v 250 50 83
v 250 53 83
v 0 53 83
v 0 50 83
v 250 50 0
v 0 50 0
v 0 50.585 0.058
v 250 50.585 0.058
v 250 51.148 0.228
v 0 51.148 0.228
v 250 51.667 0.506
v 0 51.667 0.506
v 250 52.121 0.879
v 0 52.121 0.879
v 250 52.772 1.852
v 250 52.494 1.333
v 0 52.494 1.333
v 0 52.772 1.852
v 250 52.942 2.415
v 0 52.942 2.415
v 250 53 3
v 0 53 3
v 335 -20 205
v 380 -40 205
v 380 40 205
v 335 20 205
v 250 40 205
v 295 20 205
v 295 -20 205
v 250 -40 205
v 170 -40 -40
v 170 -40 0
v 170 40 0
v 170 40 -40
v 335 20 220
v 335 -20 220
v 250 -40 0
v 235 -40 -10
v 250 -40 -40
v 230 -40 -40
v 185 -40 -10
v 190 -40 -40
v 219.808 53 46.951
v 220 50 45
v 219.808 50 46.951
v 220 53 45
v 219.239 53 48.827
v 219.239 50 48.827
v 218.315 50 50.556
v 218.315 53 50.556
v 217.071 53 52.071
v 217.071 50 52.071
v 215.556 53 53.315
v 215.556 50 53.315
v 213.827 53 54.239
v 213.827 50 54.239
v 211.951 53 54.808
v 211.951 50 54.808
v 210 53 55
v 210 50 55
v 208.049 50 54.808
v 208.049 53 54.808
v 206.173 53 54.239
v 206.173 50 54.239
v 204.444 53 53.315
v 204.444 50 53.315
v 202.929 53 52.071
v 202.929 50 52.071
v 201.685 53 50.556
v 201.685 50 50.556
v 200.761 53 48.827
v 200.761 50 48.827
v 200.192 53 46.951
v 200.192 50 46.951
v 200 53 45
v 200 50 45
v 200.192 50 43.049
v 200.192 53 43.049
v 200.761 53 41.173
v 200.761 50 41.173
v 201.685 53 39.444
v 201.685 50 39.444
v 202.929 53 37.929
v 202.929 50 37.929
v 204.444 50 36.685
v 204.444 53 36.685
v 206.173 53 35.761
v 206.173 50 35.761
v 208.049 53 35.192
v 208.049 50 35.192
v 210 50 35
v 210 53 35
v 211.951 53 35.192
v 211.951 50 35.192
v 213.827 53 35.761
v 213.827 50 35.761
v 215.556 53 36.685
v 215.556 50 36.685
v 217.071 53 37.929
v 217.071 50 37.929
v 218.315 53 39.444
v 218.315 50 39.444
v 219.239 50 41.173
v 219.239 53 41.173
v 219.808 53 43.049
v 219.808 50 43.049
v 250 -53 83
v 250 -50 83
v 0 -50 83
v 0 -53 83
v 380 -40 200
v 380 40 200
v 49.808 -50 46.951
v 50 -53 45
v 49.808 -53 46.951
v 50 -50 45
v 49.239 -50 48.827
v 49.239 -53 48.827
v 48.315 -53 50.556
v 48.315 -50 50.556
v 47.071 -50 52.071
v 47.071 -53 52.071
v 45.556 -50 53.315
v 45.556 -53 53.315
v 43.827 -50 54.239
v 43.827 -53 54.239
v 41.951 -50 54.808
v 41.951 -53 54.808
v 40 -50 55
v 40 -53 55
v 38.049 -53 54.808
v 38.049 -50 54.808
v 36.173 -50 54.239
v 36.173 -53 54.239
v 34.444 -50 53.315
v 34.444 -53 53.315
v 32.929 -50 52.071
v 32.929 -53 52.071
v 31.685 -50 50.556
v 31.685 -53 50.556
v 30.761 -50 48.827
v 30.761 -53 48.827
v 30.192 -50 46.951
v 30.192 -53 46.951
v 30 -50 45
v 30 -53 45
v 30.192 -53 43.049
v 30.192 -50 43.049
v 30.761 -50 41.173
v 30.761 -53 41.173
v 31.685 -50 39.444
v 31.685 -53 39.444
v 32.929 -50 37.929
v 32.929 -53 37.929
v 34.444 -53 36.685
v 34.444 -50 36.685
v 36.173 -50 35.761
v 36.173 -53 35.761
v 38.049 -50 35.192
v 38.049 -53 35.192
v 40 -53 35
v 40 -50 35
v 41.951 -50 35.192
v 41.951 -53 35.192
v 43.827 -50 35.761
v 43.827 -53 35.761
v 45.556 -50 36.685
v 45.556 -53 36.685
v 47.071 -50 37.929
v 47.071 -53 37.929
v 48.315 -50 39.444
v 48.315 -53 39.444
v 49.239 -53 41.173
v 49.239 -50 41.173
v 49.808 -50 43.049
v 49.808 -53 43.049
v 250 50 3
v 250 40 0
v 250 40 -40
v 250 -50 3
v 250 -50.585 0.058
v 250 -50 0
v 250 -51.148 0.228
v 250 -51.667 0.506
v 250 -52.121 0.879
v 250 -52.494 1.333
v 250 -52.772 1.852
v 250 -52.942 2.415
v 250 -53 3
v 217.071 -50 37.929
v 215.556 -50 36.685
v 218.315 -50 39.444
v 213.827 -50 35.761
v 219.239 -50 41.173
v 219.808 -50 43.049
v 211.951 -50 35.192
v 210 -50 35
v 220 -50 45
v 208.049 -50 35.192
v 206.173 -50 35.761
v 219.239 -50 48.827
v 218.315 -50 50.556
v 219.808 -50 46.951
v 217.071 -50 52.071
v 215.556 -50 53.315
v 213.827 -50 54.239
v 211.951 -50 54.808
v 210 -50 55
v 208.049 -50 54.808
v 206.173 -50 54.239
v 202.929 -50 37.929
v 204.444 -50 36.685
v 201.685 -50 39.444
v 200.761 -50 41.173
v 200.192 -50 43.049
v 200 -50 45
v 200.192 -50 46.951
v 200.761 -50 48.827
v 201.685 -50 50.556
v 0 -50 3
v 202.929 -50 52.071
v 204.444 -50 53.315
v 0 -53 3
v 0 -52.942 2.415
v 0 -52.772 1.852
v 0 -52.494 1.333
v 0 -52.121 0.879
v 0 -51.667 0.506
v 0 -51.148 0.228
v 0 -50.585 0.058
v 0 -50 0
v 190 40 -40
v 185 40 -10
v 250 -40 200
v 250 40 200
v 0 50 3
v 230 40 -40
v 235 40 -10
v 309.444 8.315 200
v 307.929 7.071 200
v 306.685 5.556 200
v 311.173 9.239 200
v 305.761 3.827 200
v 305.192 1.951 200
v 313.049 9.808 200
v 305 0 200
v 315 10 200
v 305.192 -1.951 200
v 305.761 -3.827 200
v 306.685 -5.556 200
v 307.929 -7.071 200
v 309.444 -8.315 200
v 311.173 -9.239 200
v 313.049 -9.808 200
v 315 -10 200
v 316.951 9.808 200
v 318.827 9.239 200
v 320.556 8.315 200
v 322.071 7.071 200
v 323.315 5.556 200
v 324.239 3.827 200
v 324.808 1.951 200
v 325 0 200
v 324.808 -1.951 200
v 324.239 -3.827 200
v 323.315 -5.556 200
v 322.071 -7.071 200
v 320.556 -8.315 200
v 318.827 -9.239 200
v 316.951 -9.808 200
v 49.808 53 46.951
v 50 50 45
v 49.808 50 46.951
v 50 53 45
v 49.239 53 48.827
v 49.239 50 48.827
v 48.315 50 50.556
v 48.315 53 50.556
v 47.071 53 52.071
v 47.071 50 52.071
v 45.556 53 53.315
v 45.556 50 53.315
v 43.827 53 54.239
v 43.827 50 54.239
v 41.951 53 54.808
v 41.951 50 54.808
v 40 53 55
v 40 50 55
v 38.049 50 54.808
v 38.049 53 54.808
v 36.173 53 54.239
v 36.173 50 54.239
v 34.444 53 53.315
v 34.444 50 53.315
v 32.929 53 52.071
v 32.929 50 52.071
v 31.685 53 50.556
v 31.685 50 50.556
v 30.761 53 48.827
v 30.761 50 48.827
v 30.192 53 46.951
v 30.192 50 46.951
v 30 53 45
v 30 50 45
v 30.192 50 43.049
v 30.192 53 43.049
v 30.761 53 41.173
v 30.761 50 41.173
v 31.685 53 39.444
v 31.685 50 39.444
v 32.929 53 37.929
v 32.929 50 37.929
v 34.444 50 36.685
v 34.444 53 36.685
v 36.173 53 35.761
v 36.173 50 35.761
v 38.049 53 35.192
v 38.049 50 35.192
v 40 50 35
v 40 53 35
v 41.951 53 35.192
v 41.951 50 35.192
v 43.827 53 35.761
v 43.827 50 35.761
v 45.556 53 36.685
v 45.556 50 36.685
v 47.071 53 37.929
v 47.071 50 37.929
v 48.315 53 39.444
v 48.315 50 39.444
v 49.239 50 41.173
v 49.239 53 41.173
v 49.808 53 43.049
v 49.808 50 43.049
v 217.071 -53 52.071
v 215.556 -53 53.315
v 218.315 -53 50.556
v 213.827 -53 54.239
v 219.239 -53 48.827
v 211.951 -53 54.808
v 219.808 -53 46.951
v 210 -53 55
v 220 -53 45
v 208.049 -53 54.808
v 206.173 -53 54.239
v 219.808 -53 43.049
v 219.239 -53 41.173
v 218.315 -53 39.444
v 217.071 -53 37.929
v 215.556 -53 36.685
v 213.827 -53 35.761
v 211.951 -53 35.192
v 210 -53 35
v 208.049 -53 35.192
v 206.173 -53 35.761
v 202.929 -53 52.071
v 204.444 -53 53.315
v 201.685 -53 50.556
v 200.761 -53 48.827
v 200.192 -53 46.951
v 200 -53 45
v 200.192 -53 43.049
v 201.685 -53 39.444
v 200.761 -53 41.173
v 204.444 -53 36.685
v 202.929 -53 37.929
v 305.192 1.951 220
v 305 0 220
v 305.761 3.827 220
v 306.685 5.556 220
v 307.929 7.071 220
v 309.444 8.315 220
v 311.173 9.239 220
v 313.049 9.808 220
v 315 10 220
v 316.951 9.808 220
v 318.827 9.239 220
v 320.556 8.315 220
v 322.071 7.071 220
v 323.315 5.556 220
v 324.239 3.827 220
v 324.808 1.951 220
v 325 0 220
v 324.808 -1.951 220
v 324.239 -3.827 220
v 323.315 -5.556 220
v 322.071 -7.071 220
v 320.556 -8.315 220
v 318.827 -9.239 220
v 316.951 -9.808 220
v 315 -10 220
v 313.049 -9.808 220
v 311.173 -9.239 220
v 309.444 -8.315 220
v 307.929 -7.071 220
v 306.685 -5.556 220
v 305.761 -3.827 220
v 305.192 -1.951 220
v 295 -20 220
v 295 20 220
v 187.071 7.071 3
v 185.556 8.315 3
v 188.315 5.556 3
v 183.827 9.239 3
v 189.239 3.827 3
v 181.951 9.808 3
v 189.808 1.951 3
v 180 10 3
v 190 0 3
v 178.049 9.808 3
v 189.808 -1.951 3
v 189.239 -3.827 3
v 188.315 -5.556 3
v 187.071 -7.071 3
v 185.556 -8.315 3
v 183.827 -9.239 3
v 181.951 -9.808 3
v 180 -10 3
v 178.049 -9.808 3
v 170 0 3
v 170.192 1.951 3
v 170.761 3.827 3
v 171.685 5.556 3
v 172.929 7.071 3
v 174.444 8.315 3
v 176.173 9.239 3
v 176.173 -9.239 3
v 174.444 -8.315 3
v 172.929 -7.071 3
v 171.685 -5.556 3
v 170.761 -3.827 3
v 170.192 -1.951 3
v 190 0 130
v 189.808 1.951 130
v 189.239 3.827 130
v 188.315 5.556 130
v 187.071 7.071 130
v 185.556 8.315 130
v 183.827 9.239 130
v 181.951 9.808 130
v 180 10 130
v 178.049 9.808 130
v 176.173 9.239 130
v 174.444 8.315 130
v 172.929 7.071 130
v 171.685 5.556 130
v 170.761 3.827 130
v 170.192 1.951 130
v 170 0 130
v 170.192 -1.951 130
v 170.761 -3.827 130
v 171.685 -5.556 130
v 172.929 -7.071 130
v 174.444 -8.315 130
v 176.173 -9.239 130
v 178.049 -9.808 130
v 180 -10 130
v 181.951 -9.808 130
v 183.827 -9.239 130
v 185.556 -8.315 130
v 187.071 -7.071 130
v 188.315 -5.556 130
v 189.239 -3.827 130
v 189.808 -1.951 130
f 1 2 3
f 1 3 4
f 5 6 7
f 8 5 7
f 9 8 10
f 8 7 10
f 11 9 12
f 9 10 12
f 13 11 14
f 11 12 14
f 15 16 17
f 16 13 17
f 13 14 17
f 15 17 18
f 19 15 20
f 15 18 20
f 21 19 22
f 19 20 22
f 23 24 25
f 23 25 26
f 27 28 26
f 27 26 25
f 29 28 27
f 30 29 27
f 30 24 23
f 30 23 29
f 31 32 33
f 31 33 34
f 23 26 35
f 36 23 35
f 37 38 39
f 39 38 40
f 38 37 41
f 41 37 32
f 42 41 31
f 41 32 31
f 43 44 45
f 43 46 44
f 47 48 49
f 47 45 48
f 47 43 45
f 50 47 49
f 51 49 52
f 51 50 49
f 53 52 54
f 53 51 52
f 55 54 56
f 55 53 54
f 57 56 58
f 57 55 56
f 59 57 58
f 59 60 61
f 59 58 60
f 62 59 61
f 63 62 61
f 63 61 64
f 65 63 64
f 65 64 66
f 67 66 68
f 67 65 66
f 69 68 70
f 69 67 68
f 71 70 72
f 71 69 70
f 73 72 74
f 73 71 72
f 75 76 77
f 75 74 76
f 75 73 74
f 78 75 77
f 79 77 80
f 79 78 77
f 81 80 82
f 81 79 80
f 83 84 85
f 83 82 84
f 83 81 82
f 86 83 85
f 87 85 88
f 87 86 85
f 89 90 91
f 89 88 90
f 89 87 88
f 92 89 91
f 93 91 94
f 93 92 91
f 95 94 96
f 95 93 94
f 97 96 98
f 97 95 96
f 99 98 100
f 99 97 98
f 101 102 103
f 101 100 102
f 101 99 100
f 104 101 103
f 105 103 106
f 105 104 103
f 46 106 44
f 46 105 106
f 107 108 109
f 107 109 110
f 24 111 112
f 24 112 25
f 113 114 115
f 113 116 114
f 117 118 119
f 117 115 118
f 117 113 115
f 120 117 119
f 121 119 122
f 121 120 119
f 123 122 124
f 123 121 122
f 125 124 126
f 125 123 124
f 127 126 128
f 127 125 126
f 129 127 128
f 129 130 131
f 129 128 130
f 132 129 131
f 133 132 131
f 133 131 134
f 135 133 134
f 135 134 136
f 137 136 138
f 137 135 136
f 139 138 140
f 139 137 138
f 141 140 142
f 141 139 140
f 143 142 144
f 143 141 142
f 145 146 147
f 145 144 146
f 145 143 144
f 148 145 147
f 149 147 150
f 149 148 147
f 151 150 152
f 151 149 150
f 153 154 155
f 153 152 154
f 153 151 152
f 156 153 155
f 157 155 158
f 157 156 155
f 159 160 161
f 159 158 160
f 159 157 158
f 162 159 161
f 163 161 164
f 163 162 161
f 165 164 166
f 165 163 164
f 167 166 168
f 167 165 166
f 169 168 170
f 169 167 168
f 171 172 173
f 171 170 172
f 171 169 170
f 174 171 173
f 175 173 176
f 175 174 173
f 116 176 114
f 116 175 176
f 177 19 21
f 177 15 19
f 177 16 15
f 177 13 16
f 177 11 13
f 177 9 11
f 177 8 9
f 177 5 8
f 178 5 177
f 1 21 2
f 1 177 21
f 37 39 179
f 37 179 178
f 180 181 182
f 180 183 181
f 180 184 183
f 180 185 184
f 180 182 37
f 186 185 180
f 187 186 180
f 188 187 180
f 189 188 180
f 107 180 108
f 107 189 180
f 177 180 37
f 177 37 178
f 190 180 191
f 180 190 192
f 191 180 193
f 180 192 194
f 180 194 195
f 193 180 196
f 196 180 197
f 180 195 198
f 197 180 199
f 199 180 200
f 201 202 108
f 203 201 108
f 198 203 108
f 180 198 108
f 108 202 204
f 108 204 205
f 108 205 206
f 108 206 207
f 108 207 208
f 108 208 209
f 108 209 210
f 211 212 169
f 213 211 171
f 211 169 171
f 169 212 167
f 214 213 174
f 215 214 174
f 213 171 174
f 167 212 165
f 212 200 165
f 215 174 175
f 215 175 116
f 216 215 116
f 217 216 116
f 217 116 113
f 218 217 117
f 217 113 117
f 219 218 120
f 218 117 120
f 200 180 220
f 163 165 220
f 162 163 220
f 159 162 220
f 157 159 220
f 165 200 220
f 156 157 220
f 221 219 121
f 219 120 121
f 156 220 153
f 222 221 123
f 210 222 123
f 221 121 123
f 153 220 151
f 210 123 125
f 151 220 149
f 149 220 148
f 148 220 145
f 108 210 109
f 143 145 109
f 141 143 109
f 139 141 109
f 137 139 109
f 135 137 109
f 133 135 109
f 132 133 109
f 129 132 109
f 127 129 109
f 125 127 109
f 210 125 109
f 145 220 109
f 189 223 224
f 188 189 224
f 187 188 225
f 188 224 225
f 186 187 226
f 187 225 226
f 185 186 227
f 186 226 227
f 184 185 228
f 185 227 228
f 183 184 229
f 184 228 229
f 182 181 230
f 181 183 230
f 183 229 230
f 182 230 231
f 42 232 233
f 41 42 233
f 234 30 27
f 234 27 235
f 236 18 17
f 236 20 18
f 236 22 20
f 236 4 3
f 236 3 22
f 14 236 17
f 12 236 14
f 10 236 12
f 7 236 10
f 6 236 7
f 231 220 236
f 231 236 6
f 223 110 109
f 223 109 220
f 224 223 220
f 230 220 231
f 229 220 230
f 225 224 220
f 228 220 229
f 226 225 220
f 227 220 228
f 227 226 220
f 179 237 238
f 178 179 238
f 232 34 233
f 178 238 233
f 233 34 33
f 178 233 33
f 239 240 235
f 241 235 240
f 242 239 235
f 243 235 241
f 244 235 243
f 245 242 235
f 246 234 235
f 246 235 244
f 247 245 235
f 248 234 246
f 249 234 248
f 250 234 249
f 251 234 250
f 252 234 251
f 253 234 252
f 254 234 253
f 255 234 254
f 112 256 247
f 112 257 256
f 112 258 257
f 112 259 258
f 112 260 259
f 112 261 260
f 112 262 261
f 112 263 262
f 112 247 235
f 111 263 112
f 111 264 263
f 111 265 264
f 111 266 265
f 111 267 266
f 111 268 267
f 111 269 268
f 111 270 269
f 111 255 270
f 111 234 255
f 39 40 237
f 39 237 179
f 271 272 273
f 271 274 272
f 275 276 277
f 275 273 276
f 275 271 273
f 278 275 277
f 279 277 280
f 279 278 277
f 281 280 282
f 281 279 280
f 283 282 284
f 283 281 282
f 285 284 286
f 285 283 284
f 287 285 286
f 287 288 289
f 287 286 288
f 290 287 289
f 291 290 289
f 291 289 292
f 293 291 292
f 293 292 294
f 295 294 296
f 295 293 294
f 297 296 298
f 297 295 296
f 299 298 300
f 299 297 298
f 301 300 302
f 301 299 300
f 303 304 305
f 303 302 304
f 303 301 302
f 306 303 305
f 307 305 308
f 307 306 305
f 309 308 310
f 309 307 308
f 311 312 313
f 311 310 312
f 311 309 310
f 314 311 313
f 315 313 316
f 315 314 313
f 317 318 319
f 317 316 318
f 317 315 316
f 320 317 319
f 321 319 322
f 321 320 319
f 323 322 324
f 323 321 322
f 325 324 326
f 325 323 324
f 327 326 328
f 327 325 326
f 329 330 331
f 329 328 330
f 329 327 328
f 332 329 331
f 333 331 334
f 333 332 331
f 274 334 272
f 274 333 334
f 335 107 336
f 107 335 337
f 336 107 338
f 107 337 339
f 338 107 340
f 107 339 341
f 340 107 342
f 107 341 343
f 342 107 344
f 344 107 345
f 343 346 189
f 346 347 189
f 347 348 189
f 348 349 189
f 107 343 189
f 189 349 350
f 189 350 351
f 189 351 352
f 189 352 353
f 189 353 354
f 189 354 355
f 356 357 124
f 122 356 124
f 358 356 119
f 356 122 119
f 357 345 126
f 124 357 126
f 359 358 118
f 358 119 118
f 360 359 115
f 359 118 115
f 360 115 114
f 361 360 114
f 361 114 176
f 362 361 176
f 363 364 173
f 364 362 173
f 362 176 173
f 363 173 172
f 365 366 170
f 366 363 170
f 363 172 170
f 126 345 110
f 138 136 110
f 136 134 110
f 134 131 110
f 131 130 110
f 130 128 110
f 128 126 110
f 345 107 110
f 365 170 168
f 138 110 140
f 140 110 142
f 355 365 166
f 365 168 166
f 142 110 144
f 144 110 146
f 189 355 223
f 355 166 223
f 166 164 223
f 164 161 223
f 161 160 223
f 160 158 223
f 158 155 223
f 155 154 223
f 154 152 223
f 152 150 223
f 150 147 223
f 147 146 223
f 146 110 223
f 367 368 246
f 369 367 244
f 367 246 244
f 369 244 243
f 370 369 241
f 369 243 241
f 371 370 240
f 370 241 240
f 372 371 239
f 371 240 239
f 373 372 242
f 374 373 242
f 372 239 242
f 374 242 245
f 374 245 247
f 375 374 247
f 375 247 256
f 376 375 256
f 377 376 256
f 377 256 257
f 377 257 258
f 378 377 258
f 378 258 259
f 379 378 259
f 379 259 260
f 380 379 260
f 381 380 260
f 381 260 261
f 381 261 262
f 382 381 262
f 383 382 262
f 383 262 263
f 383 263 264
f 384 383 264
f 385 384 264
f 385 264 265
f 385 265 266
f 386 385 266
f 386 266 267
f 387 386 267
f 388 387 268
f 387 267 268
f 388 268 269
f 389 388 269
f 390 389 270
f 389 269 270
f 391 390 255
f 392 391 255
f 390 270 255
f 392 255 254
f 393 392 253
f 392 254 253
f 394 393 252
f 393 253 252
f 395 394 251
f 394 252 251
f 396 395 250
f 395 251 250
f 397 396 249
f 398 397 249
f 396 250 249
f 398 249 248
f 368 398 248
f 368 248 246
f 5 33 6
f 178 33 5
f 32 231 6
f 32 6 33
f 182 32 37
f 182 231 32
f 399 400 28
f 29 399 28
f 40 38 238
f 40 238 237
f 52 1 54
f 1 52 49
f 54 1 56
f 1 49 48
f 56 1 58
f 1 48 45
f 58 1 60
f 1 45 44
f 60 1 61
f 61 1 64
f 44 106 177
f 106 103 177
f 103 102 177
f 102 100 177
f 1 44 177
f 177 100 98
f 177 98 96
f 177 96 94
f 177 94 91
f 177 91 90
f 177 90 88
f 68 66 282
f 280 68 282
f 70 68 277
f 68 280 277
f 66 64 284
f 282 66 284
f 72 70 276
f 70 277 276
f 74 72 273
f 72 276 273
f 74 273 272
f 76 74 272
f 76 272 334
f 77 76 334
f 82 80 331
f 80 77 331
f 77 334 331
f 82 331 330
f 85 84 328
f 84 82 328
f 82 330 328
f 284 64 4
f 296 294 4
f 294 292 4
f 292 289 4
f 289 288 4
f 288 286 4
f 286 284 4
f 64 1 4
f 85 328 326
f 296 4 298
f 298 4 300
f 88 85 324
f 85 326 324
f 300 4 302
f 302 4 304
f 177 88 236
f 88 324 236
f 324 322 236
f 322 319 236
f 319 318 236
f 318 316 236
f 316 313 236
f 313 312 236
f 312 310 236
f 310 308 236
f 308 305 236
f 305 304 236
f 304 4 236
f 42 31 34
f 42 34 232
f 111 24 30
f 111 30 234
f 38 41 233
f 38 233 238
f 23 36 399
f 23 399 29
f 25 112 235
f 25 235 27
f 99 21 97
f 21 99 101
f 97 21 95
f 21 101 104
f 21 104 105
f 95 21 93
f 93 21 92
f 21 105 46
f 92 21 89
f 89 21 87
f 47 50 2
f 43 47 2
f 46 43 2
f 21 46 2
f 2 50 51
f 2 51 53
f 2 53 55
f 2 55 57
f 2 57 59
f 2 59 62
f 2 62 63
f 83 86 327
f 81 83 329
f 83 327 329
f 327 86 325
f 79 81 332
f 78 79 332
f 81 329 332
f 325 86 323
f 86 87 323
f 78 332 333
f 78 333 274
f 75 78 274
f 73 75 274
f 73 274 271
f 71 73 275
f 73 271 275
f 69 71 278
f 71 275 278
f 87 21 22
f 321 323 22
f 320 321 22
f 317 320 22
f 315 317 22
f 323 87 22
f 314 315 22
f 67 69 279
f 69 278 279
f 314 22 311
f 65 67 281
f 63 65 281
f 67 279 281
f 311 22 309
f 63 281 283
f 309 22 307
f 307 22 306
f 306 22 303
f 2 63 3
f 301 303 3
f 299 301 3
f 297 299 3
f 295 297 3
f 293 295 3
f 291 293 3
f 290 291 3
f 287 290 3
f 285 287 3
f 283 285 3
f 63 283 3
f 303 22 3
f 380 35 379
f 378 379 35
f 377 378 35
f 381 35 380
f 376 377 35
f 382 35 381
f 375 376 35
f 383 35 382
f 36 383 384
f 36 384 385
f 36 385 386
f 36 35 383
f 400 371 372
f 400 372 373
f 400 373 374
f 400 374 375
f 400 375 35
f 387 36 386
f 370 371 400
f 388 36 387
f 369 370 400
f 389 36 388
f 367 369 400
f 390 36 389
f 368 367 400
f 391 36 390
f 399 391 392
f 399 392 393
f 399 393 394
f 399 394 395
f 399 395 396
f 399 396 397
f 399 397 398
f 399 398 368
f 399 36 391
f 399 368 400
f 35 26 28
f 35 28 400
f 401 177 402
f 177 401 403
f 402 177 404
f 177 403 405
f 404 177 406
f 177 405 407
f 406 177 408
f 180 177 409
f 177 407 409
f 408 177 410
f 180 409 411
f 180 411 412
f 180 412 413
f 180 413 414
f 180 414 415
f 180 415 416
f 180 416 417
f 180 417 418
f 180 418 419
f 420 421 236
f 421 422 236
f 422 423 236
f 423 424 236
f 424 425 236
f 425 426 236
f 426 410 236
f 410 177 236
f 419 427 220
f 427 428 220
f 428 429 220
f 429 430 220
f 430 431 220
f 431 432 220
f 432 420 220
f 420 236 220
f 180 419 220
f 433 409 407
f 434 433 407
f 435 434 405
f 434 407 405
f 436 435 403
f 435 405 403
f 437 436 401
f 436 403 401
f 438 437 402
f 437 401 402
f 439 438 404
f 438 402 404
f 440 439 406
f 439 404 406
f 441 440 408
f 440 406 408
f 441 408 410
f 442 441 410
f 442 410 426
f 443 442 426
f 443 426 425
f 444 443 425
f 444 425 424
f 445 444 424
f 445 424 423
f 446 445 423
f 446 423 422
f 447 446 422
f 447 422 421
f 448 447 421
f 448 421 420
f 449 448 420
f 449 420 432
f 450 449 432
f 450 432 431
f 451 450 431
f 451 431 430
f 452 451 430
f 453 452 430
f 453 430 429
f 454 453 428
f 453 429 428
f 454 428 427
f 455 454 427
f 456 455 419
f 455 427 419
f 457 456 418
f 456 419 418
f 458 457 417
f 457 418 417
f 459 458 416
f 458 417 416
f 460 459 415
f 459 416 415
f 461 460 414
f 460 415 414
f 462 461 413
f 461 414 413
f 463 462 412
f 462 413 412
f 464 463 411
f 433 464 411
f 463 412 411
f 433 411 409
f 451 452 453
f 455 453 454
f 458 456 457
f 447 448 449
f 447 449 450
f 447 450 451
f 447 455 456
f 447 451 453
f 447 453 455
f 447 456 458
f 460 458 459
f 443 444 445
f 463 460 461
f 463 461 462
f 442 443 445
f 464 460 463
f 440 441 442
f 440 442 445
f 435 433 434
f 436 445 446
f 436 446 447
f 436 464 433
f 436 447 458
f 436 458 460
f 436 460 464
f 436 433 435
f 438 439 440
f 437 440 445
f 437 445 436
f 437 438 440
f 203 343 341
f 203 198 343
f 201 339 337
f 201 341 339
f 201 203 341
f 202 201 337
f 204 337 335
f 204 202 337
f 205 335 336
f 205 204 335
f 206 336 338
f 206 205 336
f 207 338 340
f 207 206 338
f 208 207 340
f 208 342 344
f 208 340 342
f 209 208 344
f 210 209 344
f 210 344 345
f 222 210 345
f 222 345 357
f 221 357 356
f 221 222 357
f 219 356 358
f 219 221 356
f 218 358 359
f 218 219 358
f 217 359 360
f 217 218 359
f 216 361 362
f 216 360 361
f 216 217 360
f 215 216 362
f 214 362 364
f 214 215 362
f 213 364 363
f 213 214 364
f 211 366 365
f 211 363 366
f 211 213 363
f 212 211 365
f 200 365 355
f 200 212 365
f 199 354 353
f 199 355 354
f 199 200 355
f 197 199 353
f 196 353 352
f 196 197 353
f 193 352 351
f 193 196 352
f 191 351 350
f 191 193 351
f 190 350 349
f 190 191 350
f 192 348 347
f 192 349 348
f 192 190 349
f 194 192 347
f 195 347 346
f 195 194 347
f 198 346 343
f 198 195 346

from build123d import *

# Parameters (mm, degrees)
F0_W     = 250
F0_H     = 80
F0_R     = 10
F3_DEPTH = 103
F4_DEPTH = 437
F2_R     = 10
F5_DEPTH = 130
F7_D     = 20


with BuildPart() as f3:
    # F0 (on Front) → F3 (new body, symmetric)
    with BuildSketch(Plane.XZ):
        with Locations((125, 45)):
            Rectangle(F0_W, F0_H)
        with Locations((40, 45)):
            Circle(F0_R, mode=Mode.SUBTRACT)
        with Locations((210, 45)):
            Circle(F0_R, mode=Mode.SUBTRACT)
        Polygon((0, 5), (0, 0), (170, 0), (250, 0), (250, 5), align=None)
        Polygon((250, 0), (170, 0), (170, -40), (190, -40), (185, -10), (235, -10), (230, -40), (250, -40), align=None)
    extrude(amount=F3_DEPTH, both=True)


with BuildPart() as f3b:
    # F0 (on Front) → F3, piece 2 (new body, symmetric)
    with BuildSketch(Plane.XZ):
        Polygon((250, 205), (250, 200), (380, 200), (380, 205), (335, 205), (335, 220), (295, 220), (295, 205), align=None)
    extrude(amount=F3_DEPTH, both=True)


with BuildPart() as f4_tool:
    # F1 (on Right) → F4 (new body)
    with BuildSketch(Plane.YZ):
        with BuildLine():
            Line((-40, 0), (0, 0))
            Line((0, 0), (40, 0))
            Line((40, 0), (50, 0))
            ThreePointArc((50, 0), (52.1213203436, 0.8786796564), (53, 3))
            Line((53, 3), (53, 83))
            Line((53, 83), (50, 83))
            Line((50, 83), (50, 3))
            Line((50, 3), (-50, 3))
            Line((-50, 3), (-50, 83))
            Line((-50, 83), (-53, 83))
            Line((-53, 83), (-53, 3))
            ThreePointArc((-53, 3), (-52.1213203436, 0.8786796564), (-50, 0))
            Line((-50, 0), (-40, 0))
        make_face()
        Polygon((40, 0), (0, 0), (-40, 0), (-40, -40), (0, -40), (40, -40), align=None)
        Polygon((-40, 200), (0, 200), (40, 200), (40, 205), (20, 205), (20, 220), (-20, 220), (-20, 205), (-40, 205), align=None)
    extrude(amount=F4_DEPTH)


with BuildPart() as f3_1:
    add(f3.part)

    # F4: intersect by f4_tool
    add(f4_tool.part, mode=Mode.INTERSECT)

    # F2 (on Top) → F5 (join)
    with BuildSketch(Plane.XY):
        with Locations((180, 0)):
            Circle(F2_R)
    extrude(amount=F5_DEPTH)


with BuildPart() as f3b_1:
    add(f3b.part)

    # F4: intersect by f4_tool
    add(f4_tool.part, mode=Mode.INTERSECT)

    # F7 (through all)
    with Locations(Plane.XY.offset(220)):
        with Locations((315, 0)):
            Hole(F7_D / 2)


solid = Compound([f3_1.part, f3b_1.part])
